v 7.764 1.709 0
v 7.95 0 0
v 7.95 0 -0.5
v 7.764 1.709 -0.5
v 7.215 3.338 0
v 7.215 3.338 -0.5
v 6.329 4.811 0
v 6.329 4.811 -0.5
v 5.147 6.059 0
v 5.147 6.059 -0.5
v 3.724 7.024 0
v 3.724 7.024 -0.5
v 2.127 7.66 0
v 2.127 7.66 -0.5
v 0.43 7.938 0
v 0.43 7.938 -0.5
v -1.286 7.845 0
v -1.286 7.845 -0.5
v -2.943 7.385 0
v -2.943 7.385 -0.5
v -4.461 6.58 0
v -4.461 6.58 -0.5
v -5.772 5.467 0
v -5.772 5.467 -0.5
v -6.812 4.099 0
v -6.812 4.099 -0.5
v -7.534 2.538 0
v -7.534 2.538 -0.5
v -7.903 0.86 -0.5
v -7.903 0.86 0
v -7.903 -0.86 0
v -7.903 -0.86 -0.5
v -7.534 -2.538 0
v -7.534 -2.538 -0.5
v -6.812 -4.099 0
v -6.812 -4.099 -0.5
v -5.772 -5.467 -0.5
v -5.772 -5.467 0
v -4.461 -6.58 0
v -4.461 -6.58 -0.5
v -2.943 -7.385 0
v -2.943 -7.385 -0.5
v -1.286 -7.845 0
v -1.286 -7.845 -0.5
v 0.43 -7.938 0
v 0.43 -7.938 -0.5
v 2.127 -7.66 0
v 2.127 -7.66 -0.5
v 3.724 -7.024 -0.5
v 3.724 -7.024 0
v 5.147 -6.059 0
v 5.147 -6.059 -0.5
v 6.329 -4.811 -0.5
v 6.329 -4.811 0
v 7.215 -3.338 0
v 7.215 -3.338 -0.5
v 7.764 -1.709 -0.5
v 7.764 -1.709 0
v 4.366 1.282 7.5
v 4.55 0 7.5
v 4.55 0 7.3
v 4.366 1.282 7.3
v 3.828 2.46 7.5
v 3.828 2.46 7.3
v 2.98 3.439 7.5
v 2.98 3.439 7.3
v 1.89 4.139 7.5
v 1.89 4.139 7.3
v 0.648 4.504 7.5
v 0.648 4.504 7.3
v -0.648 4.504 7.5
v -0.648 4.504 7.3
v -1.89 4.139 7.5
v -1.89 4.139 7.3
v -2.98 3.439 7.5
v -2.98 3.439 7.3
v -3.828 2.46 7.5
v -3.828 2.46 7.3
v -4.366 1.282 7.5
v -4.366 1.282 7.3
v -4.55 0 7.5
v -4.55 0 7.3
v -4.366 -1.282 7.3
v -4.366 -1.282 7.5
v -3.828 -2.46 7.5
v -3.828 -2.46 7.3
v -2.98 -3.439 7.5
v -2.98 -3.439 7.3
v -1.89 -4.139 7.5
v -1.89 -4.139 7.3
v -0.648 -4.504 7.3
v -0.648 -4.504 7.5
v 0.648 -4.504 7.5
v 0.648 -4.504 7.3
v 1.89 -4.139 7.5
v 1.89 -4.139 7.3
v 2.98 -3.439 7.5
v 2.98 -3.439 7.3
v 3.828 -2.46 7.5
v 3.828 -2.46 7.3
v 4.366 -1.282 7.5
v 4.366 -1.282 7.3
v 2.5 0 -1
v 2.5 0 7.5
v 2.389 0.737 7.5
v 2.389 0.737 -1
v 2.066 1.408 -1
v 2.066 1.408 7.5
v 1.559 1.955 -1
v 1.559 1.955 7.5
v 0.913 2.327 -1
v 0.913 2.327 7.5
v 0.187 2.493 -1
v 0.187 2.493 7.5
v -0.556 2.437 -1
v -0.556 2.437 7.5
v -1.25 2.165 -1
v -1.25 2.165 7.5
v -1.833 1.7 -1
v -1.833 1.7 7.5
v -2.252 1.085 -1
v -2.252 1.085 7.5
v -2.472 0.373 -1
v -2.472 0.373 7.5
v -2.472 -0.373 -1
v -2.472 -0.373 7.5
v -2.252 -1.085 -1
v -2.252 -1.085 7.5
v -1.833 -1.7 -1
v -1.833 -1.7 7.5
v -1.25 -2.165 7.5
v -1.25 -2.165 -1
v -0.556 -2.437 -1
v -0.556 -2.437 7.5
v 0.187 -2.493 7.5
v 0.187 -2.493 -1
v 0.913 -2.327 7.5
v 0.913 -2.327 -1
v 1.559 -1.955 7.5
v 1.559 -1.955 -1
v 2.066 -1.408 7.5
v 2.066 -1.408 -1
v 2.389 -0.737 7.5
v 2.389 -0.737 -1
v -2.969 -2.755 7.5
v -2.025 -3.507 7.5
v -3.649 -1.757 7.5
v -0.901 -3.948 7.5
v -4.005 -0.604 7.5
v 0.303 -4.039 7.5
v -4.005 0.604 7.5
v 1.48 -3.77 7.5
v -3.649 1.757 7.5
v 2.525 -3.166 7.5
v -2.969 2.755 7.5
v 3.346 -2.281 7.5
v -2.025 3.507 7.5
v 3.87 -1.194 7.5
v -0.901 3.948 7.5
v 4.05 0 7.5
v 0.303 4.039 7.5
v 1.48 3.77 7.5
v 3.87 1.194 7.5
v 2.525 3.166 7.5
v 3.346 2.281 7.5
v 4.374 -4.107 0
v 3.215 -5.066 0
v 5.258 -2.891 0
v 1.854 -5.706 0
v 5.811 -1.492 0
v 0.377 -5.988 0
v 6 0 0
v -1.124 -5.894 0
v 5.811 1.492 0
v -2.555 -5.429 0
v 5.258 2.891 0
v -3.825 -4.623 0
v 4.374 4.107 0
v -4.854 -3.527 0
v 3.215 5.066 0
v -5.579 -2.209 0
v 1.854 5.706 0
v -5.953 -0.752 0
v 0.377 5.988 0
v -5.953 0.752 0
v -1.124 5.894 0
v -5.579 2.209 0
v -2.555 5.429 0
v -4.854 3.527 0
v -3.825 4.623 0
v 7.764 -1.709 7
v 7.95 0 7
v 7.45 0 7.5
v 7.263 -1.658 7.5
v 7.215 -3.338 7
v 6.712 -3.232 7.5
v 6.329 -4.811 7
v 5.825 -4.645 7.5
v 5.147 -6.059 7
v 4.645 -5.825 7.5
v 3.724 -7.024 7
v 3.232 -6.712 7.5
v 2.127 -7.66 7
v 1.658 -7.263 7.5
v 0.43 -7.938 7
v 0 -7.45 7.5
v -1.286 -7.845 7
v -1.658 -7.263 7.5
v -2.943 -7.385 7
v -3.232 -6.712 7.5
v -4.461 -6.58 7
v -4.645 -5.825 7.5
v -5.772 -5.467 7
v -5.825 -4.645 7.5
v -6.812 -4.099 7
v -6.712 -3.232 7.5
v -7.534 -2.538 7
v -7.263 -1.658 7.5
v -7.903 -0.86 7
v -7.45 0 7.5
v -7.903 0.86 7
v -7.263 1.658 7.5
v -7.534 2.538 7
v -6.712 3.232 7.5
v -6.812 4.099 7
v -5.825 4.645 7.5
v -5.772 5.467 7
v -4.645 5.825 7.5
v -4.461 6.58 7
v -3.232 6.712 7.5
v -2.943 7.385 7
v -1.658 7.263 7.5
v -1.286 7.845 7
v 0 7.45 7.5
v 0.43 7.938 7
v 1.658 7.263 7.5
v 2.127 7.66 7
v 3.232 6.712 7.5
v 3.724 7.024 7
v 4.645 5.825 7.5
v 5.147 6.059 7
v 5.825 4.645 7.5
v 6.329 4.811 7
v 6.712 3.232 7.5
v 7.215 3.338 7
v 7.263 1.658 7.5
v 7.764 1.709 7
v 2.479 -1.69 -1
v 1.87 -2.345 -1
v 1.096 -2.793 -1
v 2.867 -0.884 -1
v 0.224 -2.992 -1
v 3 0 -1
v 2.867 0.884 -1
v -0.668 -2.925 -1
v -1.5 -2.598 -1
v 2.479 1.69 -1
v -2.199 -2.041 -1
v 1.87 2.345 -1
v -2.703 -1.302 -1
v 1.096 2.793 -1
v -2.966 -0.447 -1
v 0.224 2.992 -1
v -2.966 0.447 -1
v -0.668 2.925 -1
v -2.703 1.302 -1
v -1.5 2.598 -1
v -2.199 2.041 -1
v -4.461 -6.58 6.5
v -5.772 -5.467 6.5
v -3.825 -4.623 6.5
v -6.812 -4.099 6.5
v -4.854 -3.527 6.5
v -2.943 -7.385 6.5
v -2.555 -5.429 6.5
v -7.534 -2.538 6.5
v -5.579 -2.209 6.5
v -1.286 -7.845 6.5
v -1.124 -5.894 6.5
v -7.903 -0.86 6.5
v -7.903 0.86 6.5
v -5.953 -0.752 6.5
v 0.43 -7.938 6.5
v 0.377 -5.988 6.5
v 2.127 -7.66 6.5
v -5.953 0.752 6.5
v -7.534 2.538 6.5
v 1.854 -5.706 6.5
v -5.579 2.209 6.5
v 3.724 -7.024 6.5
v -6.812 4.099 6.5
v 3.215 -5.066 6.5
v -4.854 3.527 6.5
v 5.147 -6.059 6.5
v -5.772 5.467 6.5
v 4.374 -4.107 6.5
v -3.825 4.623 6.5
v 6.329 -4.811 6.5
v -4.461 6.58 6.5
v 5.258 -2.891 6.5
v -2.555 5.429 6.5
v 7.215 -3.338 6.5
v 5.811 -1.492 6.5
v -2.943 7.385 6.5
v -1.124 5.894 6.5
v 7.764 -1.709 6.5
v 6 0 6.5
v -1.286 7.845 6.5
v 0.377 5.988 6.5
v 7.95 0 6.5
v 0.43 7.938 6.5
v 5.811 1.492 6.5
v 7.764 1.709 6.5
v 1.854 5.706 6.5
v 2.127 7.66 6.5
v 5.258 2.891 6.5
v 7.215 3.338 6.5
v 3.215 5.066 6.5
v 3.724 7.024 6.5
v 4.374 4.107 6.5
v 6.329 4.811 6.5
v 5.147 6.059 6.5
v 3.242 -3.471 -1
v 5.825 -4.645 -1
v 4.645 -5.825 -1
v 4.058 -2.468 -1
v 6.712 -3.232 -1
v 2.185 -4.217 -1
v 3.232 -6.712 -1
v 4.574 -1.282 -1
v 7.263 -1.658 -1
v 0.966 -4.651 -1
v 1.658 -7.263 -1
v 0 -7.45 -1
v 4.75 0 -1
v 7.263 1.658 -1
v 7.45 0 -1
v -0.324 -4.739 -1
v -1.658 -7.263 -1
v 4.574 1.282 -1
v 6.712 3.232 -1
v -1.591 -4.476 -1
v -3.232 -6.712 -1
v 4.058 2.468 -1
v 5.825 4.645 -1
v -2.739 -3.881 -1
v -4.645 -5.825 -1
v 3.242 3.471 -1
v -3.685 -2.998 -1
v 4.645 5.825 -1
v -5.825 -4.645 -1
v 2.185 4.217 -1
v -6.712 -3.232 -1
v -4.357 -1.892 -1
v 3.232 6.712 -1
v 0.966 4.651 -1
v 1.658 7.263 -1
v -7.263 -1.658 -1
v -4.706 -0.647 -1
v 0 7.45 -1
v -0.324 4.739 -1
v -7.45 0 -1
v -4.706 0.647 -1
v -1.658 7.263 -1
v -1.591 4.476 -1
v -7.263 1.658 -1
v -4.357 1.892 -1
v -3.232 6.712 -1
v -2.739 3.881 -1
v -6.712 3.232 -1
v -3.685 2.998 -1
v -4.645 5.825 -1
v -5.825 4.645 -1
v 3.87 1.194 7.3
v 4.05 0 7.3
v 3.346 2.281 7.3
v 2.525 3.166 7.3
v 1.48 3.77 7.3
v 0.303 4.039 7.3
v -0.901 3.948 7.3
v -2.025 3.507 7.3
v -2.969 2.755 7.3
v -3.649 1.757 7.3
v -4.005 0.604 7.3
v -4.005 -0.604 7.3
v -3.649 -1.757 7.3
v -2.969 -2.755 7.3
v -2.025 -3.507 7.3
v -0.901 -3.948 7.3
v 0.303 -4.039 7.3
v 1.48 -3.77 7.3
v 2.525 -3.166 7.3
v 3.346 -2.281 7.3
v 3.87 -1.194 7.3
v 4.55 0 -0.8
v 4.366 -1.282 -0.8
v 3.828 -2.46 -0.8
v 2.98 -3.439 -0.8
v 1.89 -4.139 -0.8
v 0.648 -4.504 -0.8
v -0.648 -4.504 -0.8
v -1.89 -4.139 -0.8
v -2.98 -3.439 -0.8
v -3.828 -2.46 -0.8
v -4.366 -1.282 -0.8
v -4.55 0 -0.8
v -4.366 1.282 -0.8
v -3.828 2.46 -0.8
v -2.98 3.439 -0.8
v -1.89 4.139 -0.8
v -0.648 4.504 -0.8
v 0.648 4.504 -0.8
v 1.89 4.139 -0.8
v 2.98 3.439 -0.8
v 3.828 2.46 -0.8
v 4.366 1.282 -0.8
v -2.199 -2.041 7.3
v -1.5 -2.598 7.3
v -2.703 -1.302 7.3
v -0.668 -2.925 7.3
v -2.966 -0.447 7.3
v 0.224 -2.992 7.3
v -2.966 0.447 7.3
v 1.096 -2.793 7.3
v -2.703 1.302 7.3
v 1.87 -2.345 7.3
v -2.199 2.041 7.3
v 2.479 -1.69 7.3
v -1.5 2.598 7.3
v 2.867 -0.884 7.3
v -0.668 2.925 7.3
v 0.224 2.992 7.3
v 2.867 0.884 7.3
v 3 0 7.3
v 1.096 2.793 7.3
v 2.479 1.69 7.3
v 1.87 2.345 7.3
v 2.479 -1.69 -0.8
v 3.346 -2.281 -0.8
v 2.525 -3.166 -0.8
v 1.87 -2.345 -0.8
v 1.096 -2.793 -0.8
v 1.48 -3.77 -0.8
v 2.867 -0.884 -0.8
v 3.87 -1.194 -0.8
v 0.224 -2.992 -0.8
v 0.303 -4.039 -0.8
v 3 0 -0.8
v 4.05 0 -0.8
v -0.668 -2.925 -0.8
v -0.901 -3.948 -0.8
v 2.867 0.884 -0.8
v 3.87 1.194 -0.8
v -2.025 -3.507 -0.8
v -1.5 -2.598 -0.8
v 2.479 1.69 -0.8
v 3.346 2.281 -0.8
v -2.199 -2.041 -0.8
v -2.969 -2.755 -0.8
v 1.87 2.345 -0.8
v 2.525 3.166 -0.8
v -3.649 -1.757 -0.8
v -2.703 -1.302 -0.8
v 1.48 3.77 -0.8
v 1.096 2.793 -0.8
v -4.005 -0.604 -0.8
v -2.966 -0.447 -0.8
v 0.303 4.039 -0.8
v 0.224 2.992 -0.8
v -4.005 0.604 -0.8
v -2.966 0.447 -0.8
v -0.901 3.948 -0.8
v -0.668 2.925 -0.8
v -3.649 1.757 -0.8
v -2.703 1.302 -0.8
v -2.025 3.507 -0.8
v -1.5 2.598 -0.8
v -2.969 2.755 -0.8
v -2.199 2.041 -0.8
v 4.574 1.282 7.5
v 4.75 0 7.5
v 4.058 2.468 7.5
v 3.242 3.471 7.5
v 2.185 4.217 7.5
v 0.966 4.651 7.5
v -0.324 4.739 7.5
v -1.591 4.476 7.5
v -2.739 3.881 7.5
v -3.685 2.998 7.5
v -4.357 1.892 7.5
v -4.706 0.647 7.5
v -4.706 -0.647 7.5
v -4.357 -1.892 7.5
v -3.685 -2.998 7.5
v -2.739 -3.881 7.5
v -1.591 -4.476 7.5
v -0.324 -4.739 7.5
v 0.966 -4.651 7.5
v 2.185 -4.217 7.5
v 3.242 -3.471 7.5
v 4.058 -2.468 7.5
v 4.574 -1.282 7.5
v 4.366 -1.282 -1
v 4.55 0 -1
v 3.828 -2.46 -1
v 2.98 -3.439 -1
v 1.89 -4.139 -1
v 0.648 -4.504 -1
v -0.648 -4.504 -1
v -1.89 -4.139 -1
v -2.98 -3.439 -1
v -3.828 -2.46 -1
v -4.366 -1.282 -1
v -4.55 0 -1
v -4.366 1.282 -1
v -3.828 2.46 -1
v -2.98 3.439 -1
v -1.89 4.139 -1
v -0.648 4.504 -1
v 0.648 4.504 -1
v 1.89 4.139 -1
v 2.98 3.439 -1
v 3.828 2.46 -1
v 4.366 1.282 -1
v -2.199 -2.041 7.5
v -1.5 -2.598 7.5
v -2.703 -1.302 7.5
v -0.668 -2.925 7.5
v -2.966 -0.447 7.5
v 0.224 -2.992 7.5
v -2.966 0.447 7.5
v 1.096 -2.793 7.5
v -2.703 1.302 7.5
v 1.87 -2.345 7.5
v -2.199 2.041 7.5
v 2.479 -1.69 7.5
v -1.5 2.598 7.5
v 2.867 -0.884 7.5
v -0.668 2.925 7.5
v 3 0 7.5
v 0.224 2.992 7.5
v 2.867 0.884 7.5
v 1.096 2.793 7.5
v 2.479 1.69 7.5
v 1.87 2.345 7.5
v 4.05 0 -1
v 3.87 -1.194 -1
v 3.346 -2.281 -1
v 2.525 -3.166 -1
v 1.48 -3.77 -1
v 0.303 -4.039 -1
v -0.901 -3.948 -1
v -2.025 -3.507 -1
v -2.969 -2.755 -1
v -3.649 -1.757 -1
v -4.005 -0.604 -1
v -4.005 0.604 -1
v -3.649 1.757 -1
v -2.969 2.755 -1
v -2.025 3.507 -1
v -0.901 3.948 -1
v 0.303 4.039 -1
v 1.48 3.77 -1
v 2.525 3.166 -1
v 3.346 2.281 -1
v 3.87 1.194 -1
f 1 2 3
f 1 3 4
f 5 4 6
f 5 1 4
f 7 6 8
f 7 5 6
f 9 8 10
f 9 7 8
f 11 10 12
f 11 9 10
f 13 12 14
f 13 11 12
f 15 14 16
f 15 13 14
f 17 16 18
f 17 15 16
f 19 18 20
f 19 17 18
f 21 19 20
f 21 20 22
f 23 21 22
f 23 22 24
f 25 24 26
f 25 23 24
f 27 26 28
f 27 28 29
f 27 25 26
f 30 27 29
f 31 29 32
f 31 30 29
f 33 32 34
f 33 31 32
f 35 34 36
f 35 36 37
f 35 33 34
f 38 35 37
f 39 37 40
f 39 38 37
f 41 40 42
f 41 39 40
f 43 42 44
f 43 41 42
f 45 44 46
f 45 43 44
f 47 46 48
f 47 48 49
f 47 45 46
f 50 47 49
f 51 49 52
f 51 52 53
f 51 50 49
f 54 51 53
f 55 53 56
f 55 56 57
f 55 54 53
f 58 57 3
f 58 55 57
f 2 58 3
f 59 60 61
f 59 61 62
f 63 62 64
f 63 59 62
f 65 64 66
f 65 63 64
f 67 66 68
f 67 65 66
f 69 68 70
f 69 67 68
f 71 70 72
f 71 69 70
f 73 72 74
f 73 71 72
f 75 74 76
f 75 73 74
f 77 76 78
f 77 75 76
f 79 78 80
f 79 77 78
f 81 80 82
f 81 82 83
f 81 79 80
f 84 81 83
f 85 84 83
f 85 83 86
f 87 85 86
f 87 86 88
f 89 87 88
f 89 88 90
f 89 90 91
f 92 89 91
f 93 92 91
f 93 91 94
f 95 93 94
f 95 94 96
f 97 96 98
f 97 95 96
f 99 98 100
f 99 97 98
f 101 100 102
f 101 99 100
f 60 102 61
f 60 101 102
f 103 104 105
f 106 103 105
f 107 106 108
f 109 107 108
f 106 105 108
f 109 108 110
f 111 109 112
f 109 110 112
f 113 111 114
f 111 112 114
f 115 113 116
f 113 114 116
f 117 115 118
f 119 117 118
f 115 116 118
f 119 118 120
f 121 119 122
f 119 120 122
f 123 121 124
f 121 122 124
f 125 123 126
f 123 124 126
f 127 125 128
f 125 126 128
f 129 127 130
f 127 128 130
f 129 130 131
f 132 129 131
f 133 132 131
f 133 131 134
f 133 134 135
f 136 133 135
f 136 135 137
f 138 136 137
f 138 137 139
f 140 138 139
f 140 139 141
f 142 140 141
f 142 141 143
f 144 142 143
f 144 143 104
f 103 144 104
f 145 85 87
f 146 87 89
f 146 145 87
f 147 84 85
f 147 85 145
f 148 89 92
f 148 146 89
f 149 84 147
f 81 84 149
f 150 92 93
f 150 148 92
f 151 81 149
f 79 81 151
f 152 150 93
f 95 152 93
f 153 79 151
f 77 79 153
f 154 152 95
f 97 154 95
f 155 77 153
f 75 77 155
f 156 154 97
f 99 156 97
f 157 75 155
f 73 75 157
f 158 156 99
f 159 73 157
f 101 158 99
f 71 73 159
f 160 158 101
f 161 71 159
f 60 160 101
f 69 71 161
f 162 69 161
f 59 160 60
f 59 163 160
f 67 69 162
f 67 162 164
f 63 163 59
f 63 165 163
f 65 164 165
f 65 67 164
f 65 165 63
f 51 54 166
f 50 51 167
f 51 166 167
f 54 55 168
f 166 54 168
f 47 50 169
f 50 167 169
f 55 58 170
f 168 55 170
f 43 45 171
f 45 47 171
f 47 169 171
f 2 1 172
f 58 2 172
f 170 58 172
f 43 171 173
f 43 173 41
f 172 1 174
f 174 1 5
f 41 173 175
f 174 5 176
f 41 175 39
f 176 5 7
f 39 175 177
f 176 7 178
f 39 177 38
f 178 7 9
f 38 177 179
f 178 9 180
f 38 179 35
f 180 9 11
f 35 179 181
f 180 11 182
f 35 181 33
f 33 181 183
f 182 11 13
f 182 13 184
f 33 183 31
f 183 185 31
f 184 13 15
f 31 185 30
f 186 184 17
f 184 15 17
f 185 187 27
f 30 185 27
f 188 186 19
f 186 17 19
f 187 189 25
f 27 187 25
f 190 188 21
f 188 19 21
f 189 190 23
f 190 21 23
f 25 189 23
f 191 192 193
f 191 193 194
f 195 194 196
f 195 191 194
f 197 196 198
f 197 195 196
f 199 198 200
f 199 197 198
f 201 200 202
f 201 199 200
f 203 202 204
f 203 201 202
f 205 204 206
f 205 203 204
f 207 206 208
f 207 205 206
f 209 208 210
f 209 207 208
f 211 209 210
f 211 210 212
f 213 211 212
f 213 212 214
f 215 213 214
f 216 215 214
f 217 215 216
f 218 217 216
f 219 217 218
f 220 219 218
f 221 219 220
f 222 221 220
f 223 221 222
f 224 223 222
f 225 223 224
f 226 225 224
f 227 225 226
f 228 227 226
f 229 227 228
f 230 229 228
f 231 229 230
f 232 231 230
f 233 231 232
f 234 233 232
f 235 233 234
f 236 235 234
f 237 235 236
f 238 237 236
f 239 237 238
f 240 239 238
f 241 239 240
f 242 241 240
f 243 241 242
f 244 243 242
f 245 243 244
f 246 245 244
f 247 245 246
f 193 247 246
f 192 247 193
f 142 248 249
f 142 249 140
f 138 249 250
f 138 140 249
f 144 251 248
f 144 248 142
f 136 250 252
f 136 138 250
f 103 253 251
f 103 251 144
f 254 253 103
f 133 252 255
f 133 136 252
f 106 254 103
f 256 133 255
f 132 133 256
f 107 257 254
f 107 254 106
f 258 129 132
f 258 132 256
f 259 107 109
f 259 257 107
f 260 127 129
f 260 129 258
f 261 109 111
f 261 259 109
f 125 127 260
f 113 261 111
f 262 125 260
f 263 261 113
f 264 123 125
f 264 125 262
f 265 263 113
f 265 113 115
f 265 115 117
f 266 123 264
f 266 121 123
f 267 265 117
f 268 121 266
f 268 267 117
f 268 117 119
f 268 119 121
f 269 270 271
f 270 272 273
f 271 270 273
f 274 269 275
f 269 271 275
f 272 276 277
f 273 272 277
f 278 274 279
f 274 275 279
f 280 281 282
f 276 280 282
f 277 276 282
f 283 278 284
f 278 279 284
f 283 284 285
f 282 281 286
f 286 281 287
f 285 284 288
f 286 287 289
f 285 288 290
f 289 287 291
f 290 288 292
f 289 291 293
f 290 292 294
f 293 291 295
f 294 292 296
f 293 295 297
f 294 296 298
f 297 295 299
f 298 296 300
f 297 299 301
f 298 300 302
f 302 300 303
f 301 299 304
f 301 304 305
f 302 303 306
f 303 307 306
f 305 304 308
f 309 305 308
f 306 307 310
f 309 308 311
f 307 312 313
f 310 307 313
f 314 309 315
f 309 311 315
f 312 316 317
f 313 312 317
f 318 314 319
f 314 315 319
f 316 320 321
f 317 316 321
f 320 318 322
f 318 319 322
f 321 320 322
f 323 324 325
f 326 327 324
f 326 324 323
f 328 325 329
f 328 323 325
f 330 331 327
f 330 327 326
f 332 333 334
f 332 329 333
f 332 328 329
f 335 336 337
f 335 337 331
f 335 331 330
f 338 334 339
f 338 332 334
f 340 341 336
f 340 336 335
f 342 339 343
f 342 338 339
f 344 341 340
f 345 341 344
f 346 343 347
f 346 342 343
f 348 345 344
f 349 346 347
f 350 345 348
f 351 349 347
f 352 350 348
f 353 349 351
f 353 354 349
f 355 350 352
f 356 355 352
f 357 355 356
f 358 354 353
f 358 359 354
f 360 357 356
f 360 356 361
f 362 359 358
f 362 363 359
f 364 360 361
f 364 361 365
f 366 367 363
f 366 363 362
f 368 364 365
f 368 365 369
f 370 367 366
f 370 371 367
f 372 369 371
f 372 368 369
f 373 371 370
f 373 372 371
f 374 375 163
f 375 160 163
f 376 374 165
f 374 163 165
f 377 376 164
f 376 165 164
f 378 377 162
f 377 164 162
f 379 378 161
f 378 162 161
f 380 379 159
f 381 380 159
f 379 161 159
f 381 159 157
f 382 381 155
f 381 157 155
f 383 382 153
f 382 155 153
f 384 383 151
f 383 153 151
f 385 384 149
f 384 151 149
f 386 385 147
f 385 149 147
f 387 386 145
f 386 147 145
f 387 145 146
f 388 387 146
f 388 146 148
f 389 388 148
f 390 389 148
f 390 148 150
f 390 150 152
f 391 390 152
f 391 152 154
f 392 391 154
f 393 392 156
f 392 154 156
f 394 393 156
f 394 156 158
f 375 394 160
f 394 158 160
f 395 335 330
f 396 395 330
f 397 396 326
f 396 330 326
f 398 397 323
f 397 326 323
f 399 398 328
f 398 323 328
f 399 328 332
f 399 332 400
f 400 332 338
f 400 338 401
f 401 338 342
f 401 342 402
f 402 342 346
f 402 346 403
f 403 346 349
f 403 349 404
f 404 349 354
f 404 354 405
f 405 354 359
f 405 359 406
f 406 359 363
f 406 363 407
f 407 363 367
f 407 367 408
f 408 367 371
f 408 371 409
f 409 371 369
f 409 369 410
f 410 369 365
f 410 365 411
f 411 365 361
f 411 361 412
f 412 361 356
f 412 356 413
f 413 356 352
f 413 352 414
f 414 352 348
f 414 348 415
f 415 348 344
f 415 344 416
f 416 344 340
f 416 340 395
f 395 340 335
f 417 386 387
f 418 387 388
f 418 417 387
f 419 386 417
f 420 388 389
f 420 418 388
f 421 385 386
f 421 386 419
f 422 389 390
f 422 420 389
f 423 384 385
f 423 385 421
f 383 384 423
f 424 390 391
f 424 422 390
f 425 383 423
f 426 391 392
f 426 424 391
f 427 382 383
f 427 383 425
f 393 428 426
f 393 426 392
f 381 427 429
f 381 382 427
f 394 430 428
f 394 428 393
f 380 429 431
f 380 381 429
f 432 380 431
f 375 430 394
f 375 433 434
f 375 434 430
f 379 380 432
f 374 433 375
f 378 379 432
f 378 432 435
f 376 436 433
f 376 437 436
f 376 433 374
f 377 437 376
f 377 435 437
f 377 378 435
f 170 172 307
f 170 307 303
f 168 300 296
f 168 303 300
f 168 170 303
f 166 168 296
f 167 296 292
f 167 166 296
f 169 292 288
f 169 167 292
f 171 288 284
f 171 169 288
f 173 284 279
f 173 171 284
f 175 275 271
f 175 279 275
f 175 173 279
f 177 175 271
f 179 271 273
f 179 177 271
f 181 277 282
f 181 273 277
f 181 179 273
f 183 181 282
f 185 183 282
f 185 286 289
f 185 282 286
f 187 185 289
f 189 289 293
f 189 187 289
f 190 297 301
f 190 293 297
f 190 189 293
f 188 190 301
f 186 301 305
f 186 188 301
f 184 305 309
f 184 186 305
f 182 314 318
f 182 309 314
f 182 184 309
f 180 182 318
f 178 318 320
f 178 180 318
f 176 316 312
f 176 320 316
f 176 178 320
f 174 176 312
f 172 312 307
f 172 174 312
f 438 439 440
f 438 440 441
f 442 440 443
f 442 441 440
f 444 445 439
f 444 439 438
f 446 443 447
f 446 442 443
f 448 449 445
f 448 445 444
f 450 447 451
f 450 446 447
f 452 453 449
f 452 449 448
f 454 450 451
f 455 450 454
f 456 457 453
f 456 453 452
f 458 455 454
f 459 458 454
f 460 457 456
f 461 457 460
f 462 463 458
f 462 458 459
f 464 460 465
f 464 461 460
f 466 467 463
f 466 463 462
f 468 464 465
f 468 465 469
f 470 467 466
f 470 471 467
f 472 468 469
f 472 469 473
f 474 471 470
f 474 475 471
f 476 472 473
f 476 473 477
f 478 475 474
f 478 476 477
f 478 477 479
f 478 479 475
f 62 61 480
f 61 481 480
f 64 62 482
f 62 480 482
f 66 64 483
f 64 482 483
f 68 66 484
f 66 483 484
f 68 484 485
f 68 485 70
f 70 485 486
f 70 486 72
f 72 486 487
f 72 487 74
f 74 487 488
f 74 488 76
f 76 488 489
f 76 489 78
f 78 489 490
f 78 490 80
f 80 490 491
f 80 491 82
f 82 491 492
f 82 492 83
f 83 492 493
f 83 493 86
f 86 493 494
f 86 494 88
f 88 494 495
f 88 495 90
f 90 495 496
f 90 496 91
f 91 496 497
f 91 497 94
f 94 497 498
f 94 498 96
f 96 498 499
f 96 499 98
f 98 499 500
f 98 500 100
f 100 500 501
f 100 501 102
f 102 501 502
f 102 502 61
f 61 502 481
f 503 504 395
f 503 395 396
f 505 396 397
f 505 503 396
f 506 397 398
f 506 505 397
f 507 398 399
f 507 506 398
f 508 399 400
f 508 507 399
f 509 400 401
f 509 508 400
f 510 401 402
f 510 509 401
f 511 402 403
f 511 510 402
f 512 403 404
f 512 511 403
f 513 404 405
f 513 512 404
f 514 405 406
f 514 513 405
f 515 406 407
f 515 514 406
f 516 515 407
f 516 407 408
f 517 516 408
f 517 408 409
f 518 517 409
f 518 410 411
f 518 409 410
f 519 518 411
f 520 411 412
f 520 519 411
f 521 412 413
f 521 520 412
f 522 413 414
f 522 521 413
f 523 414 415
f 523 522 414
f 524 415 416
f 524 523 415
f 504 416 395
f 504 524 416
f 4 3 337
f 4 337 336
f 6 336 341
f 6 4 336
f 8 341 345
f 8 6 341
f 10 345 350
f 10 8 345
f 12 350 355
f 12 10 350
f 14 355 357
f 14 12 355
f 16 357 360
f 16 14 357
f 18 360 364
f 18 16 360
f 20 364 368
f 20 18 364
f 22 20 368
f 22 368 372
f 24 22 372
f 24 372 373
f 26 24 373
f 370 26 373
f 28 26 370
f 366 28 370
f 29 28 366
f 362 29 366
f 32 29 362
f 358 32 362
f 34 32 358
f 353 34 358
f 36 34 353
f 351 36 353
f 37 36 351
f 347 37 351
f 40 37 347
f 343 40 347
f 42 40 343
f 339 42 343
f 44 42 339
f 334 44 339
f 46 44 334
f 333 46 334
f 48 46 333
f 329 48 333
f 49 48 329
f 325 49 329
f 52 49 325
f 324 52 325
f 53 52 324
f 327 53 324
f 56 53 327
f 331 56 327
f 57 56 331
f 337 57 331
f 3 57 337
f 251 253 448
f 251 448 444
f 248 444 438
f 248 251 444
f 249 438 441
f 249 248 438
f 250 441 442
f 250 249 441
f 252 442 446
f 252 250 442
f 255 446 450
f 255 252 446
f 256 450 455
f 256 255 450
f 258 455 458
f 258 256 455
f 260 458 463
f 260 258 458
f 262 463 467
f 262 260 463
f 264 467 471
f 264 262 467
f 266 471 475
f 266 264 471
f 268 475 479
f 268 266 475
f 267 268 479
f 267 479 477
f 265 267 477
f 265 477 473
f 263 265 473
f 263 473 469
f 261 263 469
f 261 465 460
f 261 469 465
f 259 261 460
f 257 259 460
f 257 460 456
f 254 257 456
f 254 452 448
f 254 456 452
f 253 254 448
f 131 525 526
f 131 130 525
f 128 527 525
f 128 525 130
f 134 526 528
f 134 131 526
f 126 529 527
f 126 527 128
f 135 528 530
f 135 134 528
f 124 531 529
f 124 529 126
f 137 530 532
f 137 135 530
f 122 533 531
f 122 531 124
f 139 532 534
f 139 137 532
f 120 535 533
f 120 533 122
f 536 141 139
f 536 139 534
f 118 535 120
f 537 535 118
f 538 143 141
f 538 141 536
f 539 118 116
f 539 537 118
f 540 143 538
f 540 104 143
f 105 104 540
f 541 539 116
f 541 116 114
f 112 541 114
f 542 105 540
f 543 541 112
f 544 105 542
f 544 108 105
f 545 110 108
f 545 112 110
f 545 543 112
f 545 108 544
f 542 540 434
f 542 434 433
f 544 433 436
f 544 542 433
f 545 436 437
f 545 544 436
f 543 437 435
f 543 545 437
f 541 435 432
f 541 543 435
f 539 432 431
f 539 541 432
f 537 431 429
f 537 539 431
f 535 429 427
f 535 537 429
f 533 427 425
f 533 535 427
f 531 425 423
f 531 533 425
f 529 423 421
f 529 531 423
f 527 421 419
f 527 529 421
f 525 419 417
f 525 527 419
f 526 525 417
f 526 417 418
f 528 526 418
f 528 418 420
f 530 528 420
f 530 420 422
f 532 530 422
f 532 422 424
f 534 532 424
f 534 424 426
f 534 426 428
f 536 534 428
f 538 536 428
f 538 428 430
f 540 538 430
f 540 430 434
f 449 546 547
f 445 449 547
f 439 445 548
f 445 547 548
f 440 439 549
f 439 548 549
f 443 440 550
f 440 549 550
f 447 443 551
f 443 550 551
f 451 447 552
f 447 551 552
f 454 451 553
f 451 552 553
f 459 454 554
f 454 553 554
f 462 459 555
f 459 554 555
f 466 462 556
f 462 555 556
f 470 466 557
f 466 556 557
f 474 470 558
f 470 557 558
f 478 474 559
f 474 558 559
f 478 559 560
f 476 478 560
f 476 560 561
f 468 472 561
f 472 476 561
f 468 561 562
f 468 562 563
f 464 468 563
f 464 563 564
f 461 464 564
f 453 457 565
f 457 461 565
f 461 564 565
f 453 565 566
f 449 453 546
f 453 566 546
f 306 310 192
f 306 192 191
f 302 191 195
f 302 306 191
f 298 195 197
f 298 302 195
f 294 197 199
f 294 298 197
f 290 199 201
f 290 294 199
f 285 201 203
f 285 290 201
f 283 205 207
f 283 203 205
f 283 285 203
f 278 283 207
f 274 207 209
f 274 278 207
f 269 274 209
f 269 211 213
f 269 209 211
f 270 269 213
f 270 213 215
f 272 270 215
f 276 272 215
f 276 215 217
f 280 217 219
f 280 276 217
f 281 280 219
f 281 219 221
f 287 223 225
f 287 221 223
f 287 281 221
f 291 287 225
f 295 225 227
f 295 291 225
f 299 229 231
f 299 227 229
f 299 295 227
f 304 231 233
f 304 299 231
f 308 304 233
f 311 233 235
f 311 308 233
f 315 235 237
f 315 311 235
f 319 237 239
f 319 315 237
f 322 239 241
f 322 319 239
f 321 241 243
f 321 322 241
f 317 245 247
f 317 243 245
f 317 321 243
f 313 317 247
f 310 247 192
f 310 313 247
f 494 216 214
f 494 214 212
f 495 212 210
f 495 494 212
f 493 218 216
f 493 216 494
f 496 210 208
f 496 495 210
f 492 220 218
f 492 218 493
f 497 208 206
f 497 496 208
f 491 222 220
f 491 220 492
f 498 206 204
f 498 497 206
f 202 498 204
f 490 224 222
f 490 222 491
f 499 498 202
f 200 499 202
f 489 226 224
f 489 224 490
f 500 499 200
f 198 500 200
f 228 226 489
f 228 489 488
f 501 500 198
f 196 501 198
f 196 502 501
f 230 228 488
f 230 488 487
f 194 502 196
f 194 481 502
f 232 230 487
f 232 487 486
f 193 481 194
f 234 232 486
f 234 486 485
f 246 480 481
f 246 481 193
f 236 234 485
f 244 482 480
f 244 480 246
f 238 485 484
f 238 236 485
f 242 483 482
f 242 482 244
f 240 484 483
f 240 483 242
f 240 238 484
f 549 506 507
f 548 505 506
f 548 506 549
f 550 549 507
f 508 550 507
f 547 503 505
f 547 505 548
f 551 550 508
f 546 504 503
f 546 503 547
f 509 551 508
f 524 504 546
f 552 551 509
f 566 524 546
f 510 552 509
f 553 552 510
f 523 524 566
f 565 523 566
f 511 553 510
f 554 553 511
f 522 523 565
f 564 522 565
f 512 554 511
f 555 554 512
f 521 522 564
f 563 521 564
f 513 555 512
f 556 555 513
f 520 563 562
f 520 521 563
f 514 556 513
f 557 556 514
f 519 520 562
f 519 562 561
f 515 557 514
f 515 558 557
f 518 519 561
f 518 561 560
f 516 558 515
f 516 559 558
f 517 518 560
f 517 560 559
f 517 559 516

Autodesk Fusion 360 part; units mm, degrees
sketch "Sketch1" plane through (0, 0, 0) normal (0, 0, 1) x (1, 0, 0)
  circle A0 centre (0, 0) radius 6
  circle A1 centre (0, 0) radius 2.5
  dimension "d1" = 12
  dimension "d2" = 5
extrude "Extrude1" add sketch "Sketch1" along normal blind 6.5 makes body 1
sketch "Sketch2" plane through (0, 0, 6.5) normal (0, 0, 1) x (1, 0, 0)
  circle A0 centre (0, 0) radius 2.5
  circle A1 centre (0, 0) radius 6
  circle A2 centre (0, 0) radius 7.95
  dimension "d5" = 15.9
extrude "Extrude2" add sketch "Sketch2" along normal blind 1 contours A1 | A2 bodies 1
sketch "Sketch3" plane through (0, 0, 7.5) normal (0, 0, 1) x (1, 0, 0)
  circle A0 centre (0, 0) radius 2.5
  circle A1 centre (0, 0) radius 7.95
  circle A2 centre (0, 0) radius 4.75
  circle A3 centre (0, 0) radius 4.55
  circle A4 centre (0, 0) radius 4.05
  circle A5 centre (0, 0) radius 3
  dimension "d8" = 3.2
  dimension "d9" = 0.2
  dimension "d10" = 0.5
  dimension "d11" = 0.5
extrude "Extrude3" cut sketch "Sketch3" against normal blind 0.2 contours A2 bodies 1
chamfer "Chamfer1" distance 0.2 angle 45 1 edges at (-4.4286, 1.7177, 7.3) on bodies 1
extrude "Extrude4" cut sketch "Sketch3" against normal blind 0.2 contours A4 bodies 1
split "Split1" by plane through (0, 0, 6.5) normal (0, 0, -1) bodies 1 makes body 2 at (5.9925, -0.2991, 2.1667)
ref_plane "WorkPlane1" through (0, 0, 3.25) normal (0, 0, -1) x (-1, 0, 0)
mirror "Mirror1" about plane through (0, 0, 3.25) normal (0, 0, -1) of bodies 1 makes body 3
combine "Combine1" operation add target body 1 tool bodies 2 3
chamfer "Chamfer2" distance 0.5 angle 45 2 edges at (-7.412, -2.8748, 7.5) (-7.412, -2.8748, -1) on bodies 1
equation "d17 = ( -6.5 / 2 ) * 1 mm"
